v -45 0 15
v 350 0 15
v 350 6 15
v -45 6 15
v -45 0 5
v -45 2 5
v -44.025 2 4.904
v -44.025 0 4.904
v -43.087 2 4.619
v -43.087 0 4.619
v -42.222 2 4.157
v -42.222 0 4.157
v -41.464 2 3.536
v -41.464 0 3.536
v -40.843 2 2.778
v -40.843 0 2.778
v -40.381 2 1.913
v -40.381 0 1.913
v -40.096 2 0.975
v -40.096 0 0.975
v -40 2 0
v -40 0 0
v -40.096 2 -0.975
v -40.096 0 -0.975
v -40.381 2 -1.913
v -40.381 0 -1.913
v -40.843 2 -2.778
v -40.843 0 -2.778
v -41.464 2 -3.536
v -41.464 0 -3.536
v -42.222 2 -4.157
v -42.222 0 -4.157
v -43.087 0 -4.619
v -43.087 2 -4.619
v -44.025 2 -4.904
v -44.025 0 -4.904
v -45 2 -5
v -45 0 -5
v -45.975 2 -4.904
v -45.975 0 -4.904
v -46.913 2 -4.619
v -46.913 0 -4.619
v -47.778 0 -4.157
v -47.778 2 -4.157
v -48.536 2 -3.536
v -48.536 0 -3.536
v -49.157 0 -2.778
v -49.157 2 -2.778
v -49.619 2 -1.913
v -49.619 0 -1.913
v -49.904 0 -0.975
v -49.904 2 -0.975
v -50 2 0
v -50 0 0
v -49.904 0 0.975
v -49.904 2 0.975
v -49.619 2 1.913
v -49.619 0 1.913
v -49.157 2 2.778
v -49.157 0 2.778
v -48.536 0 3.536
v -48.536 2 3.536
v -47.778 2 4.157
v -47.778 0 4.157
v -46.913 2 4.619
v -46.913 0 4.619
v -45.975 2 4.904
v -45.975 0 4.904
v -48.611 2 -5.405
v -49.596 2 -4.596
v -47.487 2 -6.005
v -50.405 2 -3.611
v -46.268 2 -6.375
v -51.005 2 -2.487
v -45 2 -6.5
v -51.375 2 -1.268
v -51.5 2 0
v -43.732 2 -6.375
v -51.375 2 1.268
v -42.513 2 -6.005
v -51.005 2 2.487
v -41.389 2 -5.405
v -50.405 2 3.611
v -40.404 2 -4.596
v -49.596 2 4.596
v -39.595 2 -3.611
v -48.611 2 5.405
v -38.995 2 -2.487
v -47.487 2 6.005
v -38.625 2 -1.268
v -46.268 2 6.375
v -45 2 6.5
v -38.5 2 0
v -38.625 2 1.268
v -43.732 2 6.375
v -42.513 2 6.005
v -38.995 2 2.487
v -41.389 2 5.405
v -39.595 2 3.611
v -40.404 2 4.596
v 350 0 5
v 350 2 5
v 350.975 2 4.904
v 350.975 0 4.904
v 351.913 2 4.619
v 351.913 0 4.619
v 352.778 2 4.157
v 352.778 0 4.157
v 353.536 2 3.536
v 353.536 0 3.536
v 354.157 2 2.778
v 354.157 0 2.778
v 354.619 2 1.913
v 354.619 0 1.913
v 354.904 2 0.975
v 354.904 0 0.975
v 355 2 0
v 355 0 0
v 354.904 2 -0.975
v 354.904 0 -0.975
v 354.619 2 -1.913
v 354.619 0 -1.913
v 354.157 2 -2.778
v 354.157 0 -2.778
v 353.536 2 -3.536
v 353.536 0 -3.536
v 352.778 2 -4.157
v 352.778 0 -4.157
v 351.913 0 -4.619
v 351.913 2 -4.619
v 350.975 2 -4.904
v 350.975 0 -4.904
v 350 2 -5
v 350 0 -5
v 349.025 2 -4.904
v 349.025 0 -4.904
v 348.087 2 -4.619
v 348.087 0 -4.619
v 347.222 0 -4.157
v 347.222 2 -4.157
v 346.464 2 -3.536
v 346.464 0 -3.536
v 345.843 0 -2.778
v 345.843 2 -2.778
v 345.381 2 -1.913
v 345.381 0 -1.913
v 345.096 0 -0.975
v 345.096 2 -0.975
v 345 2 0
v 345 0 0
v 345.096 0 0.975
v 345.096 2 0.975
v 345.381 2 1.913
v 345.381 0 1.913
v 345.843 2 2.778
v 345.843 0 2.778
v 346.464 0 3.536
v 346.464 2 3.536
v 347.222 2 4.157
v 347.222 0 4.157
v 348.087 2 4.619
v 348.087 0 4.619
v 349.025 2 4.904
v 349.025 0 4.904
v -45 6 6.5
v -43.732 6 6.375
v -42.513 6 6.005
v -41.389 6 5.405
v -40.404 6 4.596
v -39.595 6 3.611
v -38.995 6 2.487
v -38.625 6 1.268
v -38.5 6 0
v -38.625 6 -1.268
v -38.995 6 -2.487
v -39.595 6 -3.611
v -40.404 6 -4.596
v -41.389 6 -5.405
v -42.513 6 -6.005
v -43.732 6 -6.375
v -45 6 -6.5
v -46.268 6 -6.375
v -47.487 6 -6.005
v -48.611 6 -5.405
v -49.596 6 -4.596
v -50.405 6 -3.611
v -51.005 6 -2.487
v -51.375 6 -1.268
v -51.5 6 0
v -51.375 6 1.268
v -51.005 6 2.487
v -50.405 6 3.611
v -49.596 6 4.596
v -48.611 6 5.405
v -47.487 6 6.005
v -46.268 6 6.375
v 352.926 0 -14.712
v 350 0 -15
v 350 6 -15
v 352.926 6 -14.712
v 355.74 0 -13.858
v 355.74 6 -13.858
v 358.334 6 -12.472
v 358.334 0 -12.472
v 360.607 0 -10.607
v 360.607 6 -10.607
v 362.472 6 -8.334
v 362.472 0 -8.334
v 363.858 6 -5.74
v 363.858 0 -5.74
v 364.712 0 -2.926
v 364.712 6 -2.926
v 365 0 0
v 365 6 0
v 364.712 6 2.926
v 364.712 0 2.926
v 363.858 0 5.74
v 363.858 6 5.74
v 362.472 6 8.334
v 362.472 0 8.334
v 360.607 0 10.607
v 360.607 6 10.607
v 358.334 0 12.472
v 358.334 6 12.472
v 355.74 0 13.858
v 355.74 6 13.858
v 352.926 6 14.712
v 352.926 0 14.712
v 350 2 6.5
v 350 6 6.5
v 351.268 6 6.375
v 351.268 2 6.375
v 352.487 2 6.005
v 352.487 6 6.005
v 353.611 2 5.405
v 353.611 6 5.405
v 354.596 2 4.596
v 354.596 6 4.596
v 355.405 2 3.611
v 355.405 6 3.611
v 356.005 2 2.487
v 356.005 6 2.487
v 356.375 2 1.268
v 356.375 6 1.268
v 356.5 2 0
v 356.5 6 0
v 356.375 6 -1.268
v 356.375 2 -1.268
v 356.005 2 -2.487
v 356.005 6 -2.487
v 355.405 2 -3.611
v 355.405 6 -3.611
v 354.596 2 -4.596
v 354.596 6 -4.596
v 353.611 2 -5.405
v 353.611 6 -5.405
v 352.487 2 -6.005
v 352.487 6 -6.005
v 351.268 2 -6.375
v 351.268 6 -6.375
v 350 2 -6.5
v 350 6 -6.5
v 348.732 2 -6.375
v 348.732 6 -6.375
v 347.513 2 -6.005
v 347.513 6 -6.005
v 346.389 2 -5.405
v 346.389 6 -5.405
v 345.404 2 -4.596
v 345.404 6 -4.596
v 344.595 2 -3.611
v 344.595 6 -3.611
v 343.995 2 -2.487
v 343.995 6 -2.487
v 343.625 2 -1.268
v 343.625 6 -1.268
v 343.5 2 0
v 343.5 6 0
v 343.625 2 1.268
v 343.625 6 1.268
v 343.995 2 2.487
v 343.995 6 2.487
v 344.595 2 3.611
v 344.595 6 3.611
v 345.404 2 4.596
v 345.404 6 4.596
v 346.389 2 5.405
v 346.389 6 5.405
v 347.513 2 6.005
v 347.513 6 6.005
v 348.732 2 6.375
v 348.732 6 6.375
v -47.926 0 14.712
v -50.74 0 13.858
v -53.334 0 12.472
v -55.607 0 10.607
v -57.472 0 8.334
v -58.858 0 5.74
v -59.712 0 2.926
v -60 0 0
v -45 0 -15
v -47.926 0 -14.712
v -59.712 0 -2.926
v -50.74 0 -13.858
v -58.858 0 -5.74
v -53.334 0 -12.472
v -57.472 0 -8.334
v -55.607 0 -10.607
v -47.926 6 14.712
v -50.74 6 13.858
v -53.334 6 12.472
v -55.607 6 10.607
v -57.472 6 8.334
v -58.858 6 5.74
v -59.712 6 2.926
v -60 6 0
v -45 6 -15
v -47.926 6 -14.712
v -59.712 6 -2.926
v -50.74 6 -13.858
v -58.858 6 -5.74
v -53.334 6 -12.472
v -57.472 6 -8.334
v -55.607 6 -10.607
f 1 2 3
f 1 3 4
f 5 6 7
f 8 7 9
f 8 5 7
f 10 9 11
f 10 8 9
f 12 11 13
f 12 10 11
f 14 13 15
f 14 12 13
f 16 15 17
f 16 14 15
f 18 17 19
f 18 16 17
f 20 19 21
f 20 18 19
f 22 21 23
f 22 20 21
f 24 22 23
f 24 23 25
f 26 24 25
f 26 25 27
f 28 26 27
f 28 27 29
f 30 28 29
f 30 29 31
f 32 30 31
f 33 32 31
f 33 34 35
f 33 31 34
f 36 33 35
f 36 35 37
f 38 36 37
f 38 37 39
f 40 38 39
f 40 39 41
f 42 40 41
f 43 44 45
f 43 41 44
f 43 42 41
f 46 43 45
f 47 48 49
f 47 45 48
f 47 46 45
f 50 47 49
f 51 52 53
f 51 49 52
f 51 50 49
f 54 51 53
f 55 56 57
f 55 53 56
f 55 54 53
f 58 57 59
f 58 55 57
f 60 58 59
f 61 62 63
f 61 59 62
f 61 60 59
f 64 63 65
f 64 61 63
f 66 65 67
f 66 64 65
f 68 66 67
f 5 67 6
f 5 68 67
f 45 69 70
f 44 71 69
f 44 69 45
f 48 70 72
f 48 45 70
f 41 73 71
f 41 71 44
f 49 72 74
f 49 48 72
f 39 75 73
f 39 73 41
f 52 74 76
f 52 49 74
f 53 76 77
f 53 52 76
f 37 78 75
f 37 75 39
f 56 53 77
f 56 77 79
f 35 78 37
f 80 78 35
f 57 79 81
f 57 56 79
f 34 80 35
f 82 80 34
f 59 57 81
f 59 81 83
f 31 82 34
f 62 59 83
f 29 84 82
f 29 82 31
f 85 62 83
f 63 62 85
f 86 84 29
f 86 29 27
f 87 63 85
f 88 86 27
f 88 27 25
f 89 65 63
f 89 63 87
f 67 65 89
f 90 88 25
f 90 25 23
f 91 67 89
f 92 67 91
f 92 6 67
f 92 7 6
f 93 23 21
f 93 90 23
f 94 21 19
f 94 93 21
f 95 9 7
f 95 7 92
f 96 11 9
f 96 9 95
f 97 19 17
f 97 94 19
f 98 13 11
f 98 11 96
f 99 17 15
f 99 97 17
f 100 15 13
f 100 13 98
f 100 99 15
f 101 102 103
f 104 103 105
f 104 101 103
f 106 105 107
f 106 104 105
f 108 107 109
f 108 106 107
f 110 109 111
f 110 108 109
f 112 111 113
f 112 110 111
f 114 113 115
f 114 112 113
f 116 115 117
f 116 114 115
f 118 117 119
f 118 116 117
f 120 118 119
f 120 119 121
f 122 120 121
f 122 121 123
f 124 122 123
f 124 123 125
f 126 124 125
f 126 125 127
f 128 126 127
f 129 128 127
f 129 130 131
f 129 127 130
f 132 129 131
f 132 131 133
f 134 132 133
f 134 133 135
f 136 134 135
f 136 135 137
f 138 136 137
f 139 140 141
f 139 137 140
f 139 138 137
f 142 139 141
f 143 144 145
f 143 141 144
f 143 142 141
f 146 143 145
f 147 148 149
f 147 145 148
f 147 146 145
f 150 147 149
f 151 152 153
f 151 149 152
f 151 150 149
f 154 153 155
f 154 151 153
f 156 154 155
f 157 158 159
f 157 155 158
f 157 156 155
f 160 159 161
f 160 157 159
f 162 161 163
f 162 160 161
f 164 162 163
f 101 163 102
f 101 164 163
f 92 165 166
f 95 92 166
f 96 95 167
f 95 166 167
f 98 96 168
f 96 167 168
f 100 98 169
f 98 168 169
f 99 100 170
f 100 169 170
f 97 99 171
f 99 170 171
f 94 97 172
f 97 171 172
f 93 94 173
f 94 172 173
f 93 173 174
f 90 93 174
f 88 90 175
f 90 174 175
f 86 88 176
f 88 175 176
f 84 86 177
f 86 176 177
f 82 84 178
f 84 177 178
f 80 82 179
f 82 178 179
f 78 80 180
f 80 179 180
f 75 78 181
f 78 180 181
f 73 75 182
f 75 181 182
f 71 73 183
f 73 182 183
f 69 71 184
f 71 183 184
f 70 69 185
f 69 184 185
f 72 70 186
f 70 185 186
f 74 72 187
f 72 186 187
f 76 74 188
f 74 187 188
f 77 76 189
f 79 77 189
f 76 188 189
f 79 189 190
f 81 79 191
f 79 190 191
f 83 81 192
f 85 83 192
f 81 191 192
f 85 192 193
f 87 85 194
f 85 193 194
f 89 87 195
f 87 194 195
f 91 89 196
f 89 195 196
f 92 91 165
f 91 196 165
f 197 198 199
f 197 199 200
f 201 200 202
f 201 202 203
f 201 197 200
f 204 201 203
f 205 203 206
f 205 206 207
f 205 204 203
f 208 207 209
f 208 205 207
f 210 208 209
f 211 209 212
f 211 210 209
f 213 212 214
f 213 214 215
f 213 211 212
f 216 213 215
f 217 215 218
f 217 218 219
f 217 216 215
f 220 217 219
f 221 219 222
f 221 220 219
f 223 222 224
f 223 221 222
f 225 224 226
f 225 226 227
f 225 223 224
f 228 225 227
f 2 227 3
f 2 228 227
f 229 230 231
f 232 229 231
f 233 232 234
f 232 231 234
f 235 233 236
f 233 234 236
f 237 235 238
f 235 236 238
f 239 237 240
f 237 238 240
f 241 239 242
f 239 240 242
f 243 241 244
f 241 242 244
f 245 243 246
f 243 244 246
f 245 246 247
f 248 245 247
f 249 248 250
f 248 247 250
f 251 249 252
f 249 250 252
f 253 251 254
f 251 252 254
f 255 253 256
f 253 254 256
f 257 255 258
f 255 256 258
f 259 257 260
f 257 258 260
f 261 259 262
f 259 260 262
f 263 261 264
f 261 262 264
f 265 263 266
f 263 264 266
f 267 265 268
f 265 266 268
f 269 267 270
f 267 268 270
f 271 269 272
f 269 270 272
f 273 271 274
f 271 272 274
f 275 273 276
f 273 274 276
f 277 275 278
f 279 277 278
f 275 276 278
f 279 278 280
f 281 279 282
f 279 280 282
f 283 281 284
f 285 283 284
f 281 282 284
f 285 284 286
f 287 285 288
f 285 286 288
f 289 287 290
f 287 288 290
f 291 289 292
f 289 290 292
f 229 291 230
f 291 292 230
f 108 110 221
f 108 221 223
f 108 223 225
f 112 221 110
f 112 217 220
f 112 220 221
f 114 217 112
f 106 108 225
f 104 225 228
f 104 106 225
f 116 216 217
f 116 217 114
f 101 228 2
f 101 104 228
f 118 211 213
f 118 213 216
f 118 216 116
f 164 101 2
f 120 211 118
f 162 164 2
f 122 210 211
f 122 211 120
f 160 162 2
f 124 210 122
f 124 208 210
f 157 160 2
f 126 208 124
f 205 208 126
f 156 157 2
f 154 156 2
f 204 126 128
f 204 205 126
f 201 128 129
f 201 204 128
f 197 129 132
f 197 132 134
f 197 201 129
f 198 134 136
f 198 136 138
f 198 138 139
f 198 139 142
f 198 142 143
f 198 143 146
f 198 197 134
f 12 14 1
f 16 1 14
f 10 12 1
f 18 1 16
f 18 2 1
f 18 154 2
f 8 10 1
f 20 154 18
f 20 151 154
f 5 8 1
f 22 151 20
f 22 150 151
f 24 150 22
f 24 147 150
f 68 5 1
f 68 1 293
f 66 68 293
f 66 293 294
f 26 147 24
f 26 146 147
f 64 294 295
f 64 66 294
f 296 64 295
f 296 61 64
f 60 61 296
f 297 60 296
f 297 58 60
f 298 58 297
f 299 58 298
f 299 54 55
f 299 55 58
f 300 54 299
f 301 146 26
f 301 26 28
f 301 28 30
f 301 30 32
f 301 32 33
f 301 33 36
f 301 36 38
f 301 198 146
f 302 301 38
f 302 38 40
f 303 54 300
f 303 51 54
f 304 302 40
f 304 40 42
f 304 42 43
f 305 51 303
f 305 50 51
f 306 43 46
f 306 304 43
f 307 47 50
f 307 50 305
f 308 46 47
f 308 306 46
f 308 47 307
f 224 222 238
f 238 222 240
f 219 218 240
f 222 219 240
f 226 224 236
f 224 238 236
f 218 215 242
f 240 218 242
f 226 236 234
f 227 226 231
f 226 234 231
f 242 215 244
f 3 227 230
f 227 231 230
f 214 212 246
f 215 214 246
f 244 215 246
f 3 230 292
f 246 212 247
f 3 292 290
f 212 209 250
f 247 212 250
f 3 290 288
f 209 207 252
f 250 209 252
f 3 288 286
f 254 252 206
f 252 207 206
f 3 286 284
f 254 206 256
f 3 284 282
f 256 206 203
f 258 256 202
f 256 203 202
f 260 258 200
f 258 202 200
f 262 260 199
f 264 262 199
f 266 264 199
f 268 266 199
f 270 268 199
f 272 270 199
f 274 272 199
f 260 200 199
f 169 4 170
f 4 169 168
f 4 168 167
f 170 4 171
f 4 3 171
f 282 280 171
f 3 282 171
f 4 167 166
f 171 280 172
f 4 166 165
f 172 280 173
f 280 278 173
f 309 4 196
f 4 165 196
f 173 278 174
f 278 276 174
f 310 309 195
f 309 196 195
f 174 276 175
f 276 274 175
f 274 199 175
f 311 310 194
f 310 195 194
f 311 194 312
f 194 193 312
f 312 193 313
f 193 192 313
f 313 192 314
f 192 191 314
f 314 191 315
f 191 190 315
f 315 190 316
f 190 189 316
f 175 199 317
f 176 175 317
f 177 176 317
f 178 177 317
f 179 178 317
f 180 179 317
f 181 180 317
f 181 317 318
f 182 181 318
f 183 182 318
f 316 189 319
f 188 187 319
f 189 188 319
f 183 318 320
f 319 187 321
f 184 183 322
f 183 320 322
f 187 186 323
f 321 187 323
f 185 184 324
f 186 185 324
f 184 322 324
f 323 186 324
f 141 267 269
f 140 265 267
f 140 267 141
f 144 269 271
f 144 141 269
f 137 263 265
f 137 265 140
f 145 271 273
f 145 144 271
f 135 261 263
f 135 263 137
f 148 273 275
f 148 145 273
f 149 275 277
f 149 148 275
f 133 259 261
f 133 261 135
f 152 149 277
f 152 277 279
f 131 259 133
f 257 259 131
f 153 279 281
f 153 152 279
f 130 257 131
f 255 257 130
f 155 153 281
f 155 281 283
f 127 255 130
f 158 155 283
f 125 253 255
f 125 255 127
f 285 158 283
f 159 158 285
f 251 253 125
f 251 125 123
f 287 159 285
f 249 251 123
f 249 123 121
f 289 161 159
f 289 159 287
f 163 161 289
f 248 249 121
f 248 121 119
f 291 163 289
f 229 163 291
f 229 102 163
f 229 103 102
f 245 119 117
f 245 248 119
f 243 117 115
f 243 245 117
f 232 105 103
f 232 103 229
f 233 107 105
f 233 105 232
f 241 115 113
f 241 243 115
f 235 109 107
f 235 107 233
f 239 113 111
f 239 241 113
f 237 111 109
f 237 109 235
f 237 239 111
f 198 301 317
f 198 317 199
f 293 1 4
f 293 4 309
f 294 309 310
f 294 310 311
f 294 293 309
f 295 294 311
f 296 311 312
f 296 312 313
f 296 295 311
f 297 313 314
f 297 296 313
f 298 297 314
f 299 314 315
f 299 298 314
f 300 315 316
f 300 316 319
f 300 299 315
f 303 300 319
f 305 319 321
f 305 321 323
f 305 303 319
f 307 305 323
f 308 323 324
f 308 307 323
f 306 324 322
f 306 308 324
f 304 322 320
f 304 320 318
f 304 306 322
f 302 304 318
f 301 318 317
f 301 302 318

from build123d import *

# Parameters (mm, degrees)
SKETCH2_R           = 5
BOSS_EXTRUDE1_DEPTH = 6
SKETCH4_R           = 6.5
CUT_EXTRUDE2_DEPTH  = 4


with BuildPart() as part:
    # Sketch2 → Boss-Extrude1 (new body)
    with BuildSketch(Plane(origin=(0, 0, 0), x_dir=(1, 0, 0), z_dir=(0, 1, 0))):
        with BuildLine():
            Line((-45, 15), (350, 15))
            ThreePointArc((350, 15), (365, 0), (350, -15))
            Line((350, -15), (-45, -15))
            ThreePointArc((-45, -15), (-60, 0), (-45, 15))
        make_face()
        with Locations(Location((-45, 0, 0), (0, 0, 270))):
            Circle(SKETCH2_R, mode=Mode.SUBTRACT)
        with Locations(Location((350, 0, 0), (0, 0, 270))):
            Circle(SKETCH2_R, mode=Mode.SUBTRACT)
    extrude(amount=BOSS_EXTRUDE1_DEPTH)

    # Sketch4 → Cut-Extrude2 (cut)
    with BuildSketch(Plane(origin=(0, 6, 0), x_dir=(1, 0, 0), z_dir=(0, 1, 0))):
        with Locations(Location((-45, 0, 0), (0, 0, 270))):
            Circle(SKETCH4_R)
        with Locations(Location((350, 0, 0), (0, 0, 270))):
            Circle(SKETCH4_R)
    extrude(amount=-CUT_EXTRUDE2_DEPTH, mode=Mode.SUBTRACT)


solid = part.part
